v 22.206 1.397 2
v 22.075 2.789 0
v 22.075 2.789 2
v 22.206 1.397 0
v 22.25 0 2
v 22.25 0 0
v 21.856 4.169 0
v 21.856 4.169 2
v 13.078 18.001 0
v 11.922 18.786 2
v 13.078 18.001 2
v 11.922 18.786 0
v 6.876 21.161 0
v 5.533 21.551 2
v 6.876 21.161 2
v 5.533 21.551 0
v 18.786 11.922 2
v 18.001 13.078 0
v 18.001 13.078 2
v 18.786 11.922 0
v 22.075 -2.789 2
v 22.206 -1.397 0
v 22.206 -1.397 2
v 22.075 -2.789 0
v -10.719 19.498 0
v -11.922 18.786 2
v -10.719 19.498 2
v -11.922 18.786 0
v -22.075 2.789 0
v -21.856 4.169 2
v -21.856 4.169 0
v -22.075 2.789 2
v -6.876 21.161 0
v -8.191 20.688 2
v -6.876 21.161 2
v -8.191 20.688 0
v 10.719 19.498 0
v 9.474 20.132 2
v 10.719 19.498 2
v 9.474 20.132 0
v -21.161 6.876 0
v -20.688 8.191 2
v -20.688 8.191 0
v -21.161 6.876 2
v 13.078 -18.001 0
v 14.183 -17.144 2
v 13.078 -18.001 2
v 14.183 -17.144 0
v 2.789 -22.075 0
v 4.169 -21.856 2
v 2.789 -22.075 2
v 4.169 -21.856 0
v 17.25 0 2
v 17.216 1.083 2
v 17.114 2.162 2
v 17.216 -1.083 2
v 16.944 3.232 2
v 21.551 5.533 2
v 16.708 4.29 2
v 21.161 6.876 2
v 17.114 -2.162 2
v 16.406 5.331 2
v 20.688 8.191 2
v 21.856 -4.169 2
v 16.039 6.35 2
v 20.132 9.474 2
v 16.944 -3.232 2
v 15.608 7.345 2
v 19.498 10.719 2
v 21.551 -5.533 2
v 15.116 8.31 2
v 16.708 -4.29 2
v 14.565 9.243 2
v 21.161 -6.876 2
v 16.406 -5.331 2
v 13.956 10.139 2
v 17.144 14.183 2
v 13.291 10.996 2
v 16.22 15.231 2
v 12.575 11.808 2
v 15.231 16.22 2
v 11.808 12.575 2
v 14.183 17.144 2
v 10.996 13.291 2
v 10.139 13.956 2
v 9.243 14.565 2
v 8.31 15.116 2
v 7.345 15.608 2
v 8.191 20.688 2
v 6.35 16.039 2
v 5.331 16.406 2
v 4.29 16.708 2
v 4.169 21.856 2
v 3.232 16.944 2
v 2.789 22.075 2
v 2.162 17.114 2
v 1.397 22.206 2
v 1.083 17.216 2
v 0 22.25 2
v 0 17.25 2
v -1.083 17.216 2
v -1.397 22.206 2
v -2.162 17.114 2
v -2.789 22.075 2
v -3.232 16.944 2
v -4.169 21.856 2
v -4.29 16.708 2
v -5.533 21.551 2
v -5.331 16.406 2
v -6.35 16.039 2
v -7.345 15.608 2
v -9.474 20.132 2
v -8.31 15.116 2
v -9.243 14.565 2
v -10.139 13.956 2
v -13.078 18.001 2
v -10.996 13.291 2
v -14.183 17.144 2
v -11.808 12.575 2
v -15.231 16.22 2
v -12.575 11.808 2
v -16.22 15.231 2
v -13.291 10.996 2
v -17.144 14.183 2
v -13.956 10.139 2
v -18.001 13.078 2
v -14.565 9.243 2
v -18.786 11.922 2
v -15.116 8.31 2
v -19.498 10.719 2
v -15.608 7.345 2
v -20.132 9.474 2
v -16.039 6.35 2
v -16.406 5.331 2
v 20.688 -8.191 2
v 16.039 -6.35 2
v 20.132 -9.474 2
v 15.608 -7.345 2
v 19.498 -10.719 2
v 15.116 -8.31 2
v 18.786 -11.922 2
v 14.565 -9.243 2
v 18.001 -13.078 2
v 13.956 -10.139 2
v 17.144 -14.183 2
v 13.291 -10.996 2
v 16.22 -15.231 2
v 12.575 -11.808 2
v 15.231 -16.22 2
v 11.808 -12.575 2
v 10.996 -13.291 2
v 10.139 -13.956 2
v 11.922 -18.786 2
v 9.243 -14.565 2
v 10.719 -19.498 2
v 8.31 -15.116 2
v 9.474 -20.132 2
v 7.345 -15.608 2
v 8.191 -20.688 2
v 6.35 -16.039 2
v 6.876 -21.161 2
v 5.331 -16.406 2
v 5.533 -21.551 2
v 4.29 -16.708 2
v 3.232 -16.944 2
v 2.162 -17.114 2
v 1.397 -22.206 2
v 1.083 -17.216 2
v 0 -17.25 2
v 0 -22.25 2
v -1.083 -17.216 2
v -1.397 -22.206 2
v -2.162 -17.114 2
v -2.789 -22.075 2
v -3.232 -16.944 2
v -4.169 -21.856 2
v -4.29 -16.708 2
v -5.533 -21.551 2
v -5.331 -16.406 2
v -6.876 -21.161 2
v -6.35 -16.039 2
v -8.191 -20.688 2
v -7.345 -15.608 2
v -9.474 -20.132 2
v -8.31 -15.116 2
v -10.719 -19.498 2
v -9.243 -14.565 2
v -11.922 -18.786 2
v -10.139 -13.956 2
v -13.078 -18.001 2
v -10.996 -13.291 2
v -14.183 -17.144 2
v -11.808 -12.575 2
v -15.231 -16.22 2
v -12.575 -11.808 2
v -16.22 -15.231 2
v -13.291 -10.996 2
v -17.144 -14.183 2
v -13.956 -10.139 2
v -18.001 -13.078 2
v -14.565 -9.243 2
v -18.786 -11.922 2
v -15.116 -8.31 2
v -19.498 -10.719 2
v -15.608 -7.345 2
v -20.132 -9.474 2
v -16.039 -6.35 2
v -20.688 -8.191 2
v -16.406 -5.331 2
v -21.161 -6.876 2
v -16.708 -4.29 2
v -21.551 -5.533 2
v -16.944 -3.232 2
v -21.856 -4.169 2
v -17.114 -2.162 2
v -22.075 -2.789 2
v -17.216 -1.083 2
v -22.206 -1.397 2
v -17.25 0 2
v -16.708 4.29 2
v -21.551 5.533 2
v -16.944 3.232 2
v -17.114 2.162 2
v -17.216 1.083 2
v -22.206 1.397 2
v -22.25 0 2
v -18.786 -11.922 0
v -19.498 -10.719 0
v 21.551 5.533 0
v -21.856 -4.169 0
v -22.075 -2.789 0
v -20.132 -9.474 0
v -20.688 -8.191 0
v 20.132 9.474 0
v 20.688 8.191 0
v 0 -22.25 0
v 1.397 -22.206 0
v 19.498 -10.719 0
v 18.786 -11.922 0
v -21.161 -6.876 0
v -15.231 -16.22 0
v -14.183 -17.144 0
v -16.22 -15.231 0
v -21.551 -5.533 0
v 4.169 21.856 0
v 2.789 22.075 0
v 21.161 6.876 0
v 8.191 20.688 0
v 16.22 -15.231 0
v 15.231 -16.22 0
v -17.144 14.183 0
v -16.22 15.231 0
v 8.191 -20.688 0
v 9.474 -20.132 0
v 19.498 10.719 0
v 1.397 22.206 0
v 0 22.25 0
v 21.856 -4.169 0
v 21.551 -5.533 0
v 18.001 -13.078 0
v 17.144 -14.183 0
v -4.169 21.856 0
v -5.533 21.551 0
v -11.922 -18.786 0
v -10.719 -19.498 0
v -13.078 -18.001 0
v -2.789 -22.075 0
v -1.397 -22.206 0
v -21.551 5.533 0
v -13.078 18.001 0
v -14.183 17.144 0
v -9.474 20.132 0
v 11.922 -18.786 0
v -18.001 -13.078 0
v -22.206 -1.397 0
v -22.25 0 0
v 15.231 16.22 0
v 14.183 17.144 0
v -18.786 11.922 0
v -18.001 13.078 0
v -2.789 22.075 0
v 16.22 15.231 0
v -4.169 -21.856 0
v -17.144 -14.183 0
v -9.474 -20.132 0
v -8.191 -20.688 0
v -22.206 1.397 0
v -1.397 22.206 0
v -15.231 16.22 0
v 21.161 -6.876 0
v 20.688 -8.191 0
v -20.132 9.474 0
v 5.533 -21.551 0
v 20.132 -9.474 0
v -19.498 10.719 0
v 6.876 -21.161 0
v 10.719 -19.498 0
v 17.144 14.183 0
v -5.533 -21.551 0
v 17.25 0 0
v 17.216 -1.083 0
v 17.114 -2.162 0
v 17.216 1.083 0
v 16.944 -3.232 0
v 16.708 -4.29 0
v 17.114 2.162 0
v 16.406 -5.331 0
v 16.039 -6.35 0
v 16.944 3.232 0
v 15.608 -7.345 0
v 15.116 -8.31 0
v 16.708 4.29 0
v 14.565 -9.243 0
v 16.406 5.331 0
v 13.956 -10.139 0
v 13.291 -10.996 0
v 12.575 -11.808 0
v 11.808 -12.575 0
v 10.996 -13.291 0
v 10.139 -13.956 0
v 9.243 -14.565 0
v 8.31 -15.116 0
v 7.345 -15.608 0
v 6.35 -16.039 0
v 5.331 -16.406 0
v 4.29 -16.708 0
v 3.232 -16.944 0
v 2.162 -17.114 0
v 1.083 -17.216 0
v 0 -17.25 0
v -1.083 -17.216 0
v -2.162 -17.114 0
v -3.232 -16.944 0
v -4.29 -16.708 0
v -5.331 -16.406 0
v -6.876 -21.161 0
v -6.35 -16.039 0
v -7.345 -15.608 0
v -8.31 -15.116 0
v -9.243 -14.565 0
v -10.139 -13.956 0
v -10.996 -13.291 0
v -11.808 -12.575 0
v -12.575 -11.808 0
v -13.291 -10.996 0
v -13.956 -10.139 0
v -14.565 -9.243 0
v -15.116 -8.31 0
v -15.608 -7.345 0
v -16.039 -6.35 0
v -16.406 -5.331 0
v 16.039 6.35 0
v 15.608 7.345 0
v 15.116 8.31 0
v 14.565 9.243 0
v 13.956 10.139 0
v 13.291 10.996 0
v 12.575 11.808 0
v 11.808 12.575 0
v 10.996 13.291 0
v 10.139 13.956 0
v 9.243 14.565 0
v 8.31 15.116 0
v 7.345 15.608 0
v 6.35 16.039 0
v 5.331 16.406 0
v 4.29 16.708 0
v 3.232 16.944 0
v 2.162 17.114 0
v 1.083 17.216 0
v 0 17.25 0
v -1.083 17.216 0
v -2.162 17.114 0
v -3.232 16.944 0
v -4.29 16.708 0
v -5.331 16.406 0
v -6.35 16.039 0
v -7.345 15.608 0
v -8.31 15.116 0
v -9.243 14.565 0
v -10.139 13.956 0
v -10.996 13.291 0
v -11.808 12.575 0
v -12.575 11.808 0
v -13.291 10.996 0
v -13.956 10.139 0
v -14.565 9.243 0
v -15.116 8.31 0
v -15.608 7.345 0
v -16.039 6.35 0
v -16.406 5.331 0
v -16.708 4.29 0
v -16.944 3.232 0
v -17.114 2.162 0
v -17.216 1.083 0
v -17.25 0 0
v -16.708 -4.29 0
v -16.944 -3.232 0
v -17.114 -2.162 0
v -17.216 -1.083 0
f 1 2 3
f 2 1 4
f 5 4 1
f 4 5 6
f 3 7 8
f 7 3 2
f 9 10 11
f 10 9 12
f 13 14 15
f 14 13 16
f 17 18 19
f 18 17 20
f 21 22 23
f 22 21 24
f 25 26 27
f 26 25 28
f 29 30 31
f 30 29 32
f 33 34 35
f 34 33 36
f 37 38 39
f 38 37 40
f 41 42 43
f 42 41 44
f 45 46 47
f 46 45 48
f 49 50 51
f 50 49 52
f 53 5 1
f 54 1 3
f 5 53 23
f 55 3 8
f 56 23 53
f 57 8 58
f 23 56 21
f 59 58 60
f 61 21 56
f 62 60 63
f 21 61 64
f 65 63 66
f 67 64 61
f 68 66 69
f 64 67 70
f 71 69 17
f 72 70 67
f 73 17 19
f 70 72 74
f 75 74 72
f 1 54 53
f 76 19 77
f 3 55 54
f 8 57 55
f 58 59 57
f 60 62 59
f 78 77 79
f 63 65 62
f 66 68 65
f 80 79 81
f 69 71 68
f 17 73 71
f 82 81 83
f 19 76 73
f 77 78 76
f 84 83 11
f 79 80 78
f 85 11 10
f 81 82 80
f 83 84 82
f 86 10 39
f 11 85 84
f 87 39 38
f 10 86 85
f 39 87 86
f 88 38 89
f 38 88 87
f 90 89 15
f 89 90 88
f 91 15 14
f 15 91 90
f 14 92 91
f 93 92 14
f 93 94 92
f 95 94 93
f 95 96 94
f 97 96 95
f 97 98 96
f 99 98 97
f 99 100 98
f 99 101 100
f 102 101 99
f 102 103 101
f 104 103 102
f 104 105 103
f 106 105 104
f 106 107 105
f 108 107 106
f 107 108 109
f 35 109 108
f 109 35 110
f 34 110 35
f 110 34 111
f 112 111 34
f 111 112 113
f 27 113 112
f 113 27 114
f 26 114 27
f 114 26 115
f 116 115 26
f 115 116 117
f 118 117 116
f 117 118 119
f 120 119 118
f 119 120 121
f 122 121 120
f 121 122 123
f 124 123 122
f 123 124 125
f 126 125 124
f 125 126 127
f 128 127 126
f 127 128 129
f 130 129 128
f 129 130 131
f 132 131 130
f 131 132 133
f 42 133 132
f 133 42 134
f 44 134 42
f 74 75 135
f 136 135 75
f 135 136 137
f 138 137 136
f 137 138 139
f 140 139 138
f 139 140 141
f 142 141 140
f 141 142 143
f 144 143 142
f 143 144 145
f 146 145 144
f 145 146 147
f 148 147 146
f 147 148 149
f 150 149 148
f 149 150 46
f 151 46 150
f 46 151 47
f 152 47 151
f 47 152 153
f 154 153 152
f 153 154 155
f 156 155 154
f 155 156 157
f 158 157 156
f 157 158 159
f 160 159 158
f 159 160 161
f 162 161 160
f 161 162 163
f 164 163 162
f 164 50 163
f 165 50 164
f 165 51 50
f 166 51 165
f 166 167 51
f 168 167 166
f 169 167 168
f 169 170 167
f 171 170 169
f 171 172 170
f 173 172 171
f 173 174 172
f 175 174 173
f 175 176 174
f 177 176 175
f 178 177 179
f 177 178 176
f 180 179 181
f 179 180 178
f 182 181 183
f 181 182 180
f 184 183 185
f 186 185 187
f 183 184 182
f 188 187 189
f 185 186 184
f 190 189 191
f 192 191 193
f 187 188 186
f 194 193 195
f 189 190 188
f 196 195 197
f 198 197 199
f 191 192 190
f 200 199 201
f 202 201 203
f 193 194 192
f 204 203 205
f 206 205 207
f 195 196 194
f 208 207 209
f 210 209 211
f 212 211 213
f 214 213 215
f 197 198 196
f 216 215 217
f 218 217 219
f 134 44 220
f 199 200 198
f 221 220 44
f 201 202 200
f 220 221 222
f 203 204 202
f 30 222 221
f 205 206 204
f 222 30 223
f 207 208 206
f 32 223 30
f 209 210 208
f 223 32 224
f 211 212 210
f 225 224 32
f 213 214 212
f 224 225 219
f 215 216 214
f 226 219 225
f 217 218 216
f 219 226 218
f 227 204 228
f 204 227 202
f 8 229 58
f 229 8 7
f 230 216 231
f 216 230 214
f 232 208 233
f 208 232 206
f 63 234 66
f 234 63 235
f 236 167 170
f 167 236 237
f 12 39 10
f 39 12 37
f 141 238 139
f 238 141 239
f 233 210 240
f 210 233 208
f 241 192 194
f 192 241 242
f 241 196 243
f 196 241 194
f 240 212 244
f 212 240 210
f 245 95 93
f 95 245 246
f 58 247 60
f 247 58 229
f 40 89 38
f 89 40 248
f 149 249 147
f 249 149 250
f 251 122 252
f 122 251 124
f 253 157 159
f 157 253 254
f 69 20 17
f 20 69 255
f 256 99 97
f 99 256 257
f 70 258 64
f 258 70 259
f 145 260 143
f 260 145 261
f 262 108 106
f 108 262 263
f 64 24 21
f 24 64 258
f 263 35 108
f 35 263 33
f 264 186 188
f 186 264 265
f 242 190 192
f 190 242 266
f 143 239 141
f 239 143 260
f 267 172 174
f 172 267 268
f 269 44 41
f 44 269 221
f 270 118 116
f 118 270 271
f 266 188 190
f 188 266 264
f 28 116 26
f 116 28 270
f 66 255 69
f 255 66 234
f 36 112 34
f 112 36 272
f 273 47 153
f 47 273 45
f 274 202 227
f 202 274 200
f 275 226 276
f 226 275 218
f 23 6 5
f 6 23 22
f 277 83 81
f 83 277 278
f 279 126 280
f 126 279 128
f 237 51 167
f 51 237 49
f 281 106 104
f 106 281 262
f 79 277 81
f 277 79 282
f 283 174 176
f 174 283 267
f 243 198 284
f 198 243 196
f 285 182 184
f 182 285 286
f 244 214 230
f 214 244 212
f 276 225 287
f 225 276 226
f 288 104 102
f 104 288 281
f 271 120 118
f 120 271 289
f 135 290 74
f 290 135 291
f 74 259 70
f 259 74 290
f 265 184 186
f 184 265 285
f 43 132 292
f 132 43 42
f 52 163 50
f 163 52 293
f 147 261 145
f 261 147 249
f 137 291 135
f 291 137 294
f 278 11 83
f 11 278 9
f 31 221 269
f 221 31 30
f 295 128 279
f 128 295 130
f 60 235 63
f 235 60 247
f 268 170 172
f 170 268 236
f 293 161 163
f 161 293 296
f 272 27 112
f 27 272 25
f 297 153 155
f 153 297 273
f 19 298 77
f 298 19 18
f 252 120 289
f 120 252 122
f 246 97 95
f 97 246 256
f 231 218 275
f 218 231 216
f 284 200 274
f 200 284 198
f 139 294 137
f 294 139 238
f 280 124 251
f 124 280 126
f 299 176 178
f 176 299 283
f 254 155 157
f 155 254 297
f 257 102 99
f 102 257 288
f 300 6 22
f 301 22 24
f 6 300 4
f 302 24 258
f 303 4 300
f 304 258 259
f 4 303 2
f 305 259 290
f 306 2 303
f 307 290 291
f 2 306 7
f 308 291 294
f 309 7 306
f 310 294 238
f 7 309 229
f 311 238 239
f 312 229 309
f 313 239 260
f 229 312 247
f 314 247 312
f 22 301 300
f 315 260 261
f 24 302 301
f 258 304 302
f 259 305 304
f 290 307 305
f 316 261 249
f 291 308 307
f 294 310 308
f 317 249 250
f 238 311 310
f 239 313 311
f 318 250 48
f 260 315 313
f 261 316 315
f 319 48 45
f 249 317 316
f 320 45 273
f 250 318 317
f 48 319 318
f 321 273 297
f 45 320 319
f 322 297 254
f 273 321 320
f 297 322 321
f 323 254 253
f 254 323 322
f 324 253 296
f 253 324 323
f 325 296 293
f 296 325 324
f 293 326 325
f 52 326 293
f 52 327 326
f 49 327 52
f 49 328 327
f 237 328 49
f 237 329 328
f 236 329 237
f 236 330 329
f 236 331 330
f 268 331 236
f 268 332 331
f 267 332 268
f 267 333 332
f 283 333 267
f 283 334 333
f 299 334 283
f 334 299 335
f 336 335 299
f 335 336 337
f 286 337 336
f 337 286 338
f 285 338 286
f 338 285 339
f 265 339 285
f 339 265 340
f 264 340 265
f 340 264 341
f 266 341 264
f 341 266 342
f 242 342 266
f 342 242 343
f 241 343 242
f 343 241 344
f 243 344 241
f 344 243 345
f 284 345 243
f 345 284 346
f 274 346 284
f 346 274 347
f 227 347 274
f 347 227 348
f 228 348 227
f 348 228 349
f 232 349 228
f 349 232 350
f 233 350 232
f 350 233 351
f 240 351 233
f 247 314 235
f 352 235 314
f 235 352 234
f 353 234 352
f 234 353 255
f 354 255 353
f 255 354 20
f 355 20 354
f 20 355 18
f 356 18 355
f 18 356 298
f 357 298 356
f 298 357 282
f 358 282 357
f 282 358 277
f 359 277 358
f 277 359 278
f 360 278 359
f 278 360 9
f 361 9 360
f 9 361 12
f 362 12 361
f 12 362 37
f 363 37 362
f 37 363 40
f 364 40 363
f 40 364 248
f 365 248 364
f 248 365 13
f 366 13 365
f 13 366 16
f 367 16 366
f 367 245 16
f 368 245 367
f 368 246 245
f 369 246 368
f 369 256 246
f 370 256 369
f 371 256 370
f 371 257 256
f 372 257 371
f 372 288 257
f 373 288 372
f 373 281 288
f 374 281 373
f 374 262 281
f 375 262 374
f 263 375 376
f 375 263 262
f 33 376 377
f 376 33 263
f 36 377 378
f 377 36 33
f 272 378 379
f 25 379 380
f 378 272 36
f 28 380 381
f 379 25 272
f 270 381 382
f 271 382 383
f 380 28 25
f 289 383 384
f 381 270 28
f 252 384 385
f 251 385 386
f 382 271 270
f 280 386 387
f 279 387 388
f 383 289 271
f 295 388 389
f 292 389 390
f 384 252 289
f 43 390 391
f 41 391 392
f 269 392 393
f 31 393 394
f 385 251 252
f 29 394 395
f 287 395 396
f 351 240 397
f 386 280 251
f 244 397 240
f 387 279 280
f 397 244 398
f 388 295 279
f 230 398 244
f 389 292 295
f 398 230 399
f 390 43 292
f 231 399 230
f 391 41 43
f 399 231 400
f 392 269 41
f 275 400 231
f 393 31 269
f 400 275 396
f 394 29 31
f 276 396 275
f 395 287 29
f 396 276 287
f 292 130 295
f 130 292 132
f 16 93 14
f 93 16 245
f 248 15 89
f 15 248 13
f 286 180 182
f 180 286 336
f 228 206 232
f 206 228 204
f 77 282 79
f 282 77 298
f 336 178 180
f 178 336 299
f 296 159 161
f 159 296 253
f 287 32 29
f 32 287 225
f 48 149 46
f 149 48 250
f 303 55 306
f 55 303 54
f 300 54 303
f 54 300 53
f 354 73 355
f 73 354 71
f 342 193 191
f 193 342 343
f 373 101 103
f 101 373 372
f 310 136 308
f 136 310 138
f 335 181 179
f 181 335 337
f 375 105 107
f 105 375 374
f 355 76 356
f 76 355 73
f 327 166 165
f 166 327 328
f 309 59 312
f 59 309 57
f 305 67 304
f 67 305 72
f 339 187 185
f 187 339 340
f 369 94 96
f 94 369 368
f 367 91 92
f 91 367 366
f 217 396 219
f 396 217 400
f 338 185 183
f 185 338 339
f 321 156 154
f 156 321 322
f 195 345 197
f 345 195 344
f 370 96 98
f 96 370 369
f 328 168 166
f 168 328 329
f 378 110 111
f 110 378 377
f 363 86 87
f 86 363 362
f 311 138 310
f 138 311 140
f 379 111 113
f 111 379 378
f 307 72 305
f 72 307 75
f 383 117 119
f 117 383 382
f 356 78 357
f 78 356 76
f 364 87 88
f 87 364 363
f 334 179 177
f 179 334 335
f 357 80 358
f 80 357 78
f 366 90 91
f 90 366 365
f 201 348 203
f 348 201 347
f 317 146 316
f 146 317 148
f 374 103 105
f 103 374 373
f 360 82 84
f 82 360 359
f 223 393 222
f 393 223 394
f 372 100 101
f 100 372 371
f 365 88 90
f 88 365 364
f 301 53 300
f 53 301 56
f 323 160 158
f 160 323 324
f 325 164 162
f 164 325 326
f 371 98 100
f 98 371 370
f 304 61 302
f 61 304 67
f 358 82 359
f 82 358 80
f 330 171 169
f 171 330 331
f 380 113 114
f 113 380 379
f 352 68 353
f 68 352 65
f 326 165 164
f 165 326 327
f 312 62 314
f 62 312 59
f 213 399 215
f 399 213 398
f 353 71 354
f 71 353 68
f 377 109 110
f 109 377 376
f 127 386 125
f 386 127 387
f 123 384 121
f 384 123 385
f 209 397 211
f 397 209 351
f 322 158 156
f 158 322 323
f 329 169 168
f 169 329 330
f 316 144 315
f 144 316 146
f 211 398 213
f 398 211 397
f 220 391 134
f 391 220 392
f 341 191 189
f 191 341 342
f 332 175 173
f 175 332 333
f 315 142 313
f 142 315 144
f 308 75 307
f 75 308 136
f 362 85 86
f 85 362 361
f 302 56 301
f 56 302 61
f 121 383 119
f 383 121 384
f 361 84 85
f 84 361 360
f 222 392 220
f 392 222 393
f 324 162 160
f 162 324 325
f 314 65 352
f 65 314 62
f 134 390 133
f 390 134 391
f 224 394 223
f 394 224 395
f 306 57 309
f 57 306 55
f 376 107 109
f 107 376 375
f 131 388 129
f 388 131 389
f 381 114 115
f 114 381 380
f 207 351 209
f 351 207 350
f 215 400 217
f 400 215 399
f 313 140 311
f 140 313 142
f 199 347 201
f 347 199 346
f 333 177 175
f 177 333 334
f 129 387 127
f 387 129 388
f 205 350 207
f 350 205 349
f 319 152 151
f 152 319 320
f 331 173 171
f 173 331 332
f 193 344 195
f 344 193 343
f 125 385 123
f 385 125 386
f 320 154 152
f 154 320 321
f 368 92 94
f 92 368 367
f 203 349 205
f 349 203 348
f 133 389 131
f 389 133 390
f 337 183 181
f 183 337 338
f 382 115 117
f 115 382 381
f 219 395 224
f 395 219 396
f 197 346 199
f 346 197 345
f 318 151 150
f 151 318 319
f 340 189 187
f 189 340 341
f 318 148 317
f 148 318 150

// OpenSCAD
//in milimeters
//material flex
//t 90/245
hole_diameter=34.5;
outer_diameter=44.5;
thickness=2;

translate([0,0,thickness/2]){
difference(){
//outer
cylinder(h=thickness,r=outer_diameter/2,center=true,$fn=100);
//hole
cylinder(h=thickness+2,r=hole_diameter/2,center=true,$fn=100);
}
}
